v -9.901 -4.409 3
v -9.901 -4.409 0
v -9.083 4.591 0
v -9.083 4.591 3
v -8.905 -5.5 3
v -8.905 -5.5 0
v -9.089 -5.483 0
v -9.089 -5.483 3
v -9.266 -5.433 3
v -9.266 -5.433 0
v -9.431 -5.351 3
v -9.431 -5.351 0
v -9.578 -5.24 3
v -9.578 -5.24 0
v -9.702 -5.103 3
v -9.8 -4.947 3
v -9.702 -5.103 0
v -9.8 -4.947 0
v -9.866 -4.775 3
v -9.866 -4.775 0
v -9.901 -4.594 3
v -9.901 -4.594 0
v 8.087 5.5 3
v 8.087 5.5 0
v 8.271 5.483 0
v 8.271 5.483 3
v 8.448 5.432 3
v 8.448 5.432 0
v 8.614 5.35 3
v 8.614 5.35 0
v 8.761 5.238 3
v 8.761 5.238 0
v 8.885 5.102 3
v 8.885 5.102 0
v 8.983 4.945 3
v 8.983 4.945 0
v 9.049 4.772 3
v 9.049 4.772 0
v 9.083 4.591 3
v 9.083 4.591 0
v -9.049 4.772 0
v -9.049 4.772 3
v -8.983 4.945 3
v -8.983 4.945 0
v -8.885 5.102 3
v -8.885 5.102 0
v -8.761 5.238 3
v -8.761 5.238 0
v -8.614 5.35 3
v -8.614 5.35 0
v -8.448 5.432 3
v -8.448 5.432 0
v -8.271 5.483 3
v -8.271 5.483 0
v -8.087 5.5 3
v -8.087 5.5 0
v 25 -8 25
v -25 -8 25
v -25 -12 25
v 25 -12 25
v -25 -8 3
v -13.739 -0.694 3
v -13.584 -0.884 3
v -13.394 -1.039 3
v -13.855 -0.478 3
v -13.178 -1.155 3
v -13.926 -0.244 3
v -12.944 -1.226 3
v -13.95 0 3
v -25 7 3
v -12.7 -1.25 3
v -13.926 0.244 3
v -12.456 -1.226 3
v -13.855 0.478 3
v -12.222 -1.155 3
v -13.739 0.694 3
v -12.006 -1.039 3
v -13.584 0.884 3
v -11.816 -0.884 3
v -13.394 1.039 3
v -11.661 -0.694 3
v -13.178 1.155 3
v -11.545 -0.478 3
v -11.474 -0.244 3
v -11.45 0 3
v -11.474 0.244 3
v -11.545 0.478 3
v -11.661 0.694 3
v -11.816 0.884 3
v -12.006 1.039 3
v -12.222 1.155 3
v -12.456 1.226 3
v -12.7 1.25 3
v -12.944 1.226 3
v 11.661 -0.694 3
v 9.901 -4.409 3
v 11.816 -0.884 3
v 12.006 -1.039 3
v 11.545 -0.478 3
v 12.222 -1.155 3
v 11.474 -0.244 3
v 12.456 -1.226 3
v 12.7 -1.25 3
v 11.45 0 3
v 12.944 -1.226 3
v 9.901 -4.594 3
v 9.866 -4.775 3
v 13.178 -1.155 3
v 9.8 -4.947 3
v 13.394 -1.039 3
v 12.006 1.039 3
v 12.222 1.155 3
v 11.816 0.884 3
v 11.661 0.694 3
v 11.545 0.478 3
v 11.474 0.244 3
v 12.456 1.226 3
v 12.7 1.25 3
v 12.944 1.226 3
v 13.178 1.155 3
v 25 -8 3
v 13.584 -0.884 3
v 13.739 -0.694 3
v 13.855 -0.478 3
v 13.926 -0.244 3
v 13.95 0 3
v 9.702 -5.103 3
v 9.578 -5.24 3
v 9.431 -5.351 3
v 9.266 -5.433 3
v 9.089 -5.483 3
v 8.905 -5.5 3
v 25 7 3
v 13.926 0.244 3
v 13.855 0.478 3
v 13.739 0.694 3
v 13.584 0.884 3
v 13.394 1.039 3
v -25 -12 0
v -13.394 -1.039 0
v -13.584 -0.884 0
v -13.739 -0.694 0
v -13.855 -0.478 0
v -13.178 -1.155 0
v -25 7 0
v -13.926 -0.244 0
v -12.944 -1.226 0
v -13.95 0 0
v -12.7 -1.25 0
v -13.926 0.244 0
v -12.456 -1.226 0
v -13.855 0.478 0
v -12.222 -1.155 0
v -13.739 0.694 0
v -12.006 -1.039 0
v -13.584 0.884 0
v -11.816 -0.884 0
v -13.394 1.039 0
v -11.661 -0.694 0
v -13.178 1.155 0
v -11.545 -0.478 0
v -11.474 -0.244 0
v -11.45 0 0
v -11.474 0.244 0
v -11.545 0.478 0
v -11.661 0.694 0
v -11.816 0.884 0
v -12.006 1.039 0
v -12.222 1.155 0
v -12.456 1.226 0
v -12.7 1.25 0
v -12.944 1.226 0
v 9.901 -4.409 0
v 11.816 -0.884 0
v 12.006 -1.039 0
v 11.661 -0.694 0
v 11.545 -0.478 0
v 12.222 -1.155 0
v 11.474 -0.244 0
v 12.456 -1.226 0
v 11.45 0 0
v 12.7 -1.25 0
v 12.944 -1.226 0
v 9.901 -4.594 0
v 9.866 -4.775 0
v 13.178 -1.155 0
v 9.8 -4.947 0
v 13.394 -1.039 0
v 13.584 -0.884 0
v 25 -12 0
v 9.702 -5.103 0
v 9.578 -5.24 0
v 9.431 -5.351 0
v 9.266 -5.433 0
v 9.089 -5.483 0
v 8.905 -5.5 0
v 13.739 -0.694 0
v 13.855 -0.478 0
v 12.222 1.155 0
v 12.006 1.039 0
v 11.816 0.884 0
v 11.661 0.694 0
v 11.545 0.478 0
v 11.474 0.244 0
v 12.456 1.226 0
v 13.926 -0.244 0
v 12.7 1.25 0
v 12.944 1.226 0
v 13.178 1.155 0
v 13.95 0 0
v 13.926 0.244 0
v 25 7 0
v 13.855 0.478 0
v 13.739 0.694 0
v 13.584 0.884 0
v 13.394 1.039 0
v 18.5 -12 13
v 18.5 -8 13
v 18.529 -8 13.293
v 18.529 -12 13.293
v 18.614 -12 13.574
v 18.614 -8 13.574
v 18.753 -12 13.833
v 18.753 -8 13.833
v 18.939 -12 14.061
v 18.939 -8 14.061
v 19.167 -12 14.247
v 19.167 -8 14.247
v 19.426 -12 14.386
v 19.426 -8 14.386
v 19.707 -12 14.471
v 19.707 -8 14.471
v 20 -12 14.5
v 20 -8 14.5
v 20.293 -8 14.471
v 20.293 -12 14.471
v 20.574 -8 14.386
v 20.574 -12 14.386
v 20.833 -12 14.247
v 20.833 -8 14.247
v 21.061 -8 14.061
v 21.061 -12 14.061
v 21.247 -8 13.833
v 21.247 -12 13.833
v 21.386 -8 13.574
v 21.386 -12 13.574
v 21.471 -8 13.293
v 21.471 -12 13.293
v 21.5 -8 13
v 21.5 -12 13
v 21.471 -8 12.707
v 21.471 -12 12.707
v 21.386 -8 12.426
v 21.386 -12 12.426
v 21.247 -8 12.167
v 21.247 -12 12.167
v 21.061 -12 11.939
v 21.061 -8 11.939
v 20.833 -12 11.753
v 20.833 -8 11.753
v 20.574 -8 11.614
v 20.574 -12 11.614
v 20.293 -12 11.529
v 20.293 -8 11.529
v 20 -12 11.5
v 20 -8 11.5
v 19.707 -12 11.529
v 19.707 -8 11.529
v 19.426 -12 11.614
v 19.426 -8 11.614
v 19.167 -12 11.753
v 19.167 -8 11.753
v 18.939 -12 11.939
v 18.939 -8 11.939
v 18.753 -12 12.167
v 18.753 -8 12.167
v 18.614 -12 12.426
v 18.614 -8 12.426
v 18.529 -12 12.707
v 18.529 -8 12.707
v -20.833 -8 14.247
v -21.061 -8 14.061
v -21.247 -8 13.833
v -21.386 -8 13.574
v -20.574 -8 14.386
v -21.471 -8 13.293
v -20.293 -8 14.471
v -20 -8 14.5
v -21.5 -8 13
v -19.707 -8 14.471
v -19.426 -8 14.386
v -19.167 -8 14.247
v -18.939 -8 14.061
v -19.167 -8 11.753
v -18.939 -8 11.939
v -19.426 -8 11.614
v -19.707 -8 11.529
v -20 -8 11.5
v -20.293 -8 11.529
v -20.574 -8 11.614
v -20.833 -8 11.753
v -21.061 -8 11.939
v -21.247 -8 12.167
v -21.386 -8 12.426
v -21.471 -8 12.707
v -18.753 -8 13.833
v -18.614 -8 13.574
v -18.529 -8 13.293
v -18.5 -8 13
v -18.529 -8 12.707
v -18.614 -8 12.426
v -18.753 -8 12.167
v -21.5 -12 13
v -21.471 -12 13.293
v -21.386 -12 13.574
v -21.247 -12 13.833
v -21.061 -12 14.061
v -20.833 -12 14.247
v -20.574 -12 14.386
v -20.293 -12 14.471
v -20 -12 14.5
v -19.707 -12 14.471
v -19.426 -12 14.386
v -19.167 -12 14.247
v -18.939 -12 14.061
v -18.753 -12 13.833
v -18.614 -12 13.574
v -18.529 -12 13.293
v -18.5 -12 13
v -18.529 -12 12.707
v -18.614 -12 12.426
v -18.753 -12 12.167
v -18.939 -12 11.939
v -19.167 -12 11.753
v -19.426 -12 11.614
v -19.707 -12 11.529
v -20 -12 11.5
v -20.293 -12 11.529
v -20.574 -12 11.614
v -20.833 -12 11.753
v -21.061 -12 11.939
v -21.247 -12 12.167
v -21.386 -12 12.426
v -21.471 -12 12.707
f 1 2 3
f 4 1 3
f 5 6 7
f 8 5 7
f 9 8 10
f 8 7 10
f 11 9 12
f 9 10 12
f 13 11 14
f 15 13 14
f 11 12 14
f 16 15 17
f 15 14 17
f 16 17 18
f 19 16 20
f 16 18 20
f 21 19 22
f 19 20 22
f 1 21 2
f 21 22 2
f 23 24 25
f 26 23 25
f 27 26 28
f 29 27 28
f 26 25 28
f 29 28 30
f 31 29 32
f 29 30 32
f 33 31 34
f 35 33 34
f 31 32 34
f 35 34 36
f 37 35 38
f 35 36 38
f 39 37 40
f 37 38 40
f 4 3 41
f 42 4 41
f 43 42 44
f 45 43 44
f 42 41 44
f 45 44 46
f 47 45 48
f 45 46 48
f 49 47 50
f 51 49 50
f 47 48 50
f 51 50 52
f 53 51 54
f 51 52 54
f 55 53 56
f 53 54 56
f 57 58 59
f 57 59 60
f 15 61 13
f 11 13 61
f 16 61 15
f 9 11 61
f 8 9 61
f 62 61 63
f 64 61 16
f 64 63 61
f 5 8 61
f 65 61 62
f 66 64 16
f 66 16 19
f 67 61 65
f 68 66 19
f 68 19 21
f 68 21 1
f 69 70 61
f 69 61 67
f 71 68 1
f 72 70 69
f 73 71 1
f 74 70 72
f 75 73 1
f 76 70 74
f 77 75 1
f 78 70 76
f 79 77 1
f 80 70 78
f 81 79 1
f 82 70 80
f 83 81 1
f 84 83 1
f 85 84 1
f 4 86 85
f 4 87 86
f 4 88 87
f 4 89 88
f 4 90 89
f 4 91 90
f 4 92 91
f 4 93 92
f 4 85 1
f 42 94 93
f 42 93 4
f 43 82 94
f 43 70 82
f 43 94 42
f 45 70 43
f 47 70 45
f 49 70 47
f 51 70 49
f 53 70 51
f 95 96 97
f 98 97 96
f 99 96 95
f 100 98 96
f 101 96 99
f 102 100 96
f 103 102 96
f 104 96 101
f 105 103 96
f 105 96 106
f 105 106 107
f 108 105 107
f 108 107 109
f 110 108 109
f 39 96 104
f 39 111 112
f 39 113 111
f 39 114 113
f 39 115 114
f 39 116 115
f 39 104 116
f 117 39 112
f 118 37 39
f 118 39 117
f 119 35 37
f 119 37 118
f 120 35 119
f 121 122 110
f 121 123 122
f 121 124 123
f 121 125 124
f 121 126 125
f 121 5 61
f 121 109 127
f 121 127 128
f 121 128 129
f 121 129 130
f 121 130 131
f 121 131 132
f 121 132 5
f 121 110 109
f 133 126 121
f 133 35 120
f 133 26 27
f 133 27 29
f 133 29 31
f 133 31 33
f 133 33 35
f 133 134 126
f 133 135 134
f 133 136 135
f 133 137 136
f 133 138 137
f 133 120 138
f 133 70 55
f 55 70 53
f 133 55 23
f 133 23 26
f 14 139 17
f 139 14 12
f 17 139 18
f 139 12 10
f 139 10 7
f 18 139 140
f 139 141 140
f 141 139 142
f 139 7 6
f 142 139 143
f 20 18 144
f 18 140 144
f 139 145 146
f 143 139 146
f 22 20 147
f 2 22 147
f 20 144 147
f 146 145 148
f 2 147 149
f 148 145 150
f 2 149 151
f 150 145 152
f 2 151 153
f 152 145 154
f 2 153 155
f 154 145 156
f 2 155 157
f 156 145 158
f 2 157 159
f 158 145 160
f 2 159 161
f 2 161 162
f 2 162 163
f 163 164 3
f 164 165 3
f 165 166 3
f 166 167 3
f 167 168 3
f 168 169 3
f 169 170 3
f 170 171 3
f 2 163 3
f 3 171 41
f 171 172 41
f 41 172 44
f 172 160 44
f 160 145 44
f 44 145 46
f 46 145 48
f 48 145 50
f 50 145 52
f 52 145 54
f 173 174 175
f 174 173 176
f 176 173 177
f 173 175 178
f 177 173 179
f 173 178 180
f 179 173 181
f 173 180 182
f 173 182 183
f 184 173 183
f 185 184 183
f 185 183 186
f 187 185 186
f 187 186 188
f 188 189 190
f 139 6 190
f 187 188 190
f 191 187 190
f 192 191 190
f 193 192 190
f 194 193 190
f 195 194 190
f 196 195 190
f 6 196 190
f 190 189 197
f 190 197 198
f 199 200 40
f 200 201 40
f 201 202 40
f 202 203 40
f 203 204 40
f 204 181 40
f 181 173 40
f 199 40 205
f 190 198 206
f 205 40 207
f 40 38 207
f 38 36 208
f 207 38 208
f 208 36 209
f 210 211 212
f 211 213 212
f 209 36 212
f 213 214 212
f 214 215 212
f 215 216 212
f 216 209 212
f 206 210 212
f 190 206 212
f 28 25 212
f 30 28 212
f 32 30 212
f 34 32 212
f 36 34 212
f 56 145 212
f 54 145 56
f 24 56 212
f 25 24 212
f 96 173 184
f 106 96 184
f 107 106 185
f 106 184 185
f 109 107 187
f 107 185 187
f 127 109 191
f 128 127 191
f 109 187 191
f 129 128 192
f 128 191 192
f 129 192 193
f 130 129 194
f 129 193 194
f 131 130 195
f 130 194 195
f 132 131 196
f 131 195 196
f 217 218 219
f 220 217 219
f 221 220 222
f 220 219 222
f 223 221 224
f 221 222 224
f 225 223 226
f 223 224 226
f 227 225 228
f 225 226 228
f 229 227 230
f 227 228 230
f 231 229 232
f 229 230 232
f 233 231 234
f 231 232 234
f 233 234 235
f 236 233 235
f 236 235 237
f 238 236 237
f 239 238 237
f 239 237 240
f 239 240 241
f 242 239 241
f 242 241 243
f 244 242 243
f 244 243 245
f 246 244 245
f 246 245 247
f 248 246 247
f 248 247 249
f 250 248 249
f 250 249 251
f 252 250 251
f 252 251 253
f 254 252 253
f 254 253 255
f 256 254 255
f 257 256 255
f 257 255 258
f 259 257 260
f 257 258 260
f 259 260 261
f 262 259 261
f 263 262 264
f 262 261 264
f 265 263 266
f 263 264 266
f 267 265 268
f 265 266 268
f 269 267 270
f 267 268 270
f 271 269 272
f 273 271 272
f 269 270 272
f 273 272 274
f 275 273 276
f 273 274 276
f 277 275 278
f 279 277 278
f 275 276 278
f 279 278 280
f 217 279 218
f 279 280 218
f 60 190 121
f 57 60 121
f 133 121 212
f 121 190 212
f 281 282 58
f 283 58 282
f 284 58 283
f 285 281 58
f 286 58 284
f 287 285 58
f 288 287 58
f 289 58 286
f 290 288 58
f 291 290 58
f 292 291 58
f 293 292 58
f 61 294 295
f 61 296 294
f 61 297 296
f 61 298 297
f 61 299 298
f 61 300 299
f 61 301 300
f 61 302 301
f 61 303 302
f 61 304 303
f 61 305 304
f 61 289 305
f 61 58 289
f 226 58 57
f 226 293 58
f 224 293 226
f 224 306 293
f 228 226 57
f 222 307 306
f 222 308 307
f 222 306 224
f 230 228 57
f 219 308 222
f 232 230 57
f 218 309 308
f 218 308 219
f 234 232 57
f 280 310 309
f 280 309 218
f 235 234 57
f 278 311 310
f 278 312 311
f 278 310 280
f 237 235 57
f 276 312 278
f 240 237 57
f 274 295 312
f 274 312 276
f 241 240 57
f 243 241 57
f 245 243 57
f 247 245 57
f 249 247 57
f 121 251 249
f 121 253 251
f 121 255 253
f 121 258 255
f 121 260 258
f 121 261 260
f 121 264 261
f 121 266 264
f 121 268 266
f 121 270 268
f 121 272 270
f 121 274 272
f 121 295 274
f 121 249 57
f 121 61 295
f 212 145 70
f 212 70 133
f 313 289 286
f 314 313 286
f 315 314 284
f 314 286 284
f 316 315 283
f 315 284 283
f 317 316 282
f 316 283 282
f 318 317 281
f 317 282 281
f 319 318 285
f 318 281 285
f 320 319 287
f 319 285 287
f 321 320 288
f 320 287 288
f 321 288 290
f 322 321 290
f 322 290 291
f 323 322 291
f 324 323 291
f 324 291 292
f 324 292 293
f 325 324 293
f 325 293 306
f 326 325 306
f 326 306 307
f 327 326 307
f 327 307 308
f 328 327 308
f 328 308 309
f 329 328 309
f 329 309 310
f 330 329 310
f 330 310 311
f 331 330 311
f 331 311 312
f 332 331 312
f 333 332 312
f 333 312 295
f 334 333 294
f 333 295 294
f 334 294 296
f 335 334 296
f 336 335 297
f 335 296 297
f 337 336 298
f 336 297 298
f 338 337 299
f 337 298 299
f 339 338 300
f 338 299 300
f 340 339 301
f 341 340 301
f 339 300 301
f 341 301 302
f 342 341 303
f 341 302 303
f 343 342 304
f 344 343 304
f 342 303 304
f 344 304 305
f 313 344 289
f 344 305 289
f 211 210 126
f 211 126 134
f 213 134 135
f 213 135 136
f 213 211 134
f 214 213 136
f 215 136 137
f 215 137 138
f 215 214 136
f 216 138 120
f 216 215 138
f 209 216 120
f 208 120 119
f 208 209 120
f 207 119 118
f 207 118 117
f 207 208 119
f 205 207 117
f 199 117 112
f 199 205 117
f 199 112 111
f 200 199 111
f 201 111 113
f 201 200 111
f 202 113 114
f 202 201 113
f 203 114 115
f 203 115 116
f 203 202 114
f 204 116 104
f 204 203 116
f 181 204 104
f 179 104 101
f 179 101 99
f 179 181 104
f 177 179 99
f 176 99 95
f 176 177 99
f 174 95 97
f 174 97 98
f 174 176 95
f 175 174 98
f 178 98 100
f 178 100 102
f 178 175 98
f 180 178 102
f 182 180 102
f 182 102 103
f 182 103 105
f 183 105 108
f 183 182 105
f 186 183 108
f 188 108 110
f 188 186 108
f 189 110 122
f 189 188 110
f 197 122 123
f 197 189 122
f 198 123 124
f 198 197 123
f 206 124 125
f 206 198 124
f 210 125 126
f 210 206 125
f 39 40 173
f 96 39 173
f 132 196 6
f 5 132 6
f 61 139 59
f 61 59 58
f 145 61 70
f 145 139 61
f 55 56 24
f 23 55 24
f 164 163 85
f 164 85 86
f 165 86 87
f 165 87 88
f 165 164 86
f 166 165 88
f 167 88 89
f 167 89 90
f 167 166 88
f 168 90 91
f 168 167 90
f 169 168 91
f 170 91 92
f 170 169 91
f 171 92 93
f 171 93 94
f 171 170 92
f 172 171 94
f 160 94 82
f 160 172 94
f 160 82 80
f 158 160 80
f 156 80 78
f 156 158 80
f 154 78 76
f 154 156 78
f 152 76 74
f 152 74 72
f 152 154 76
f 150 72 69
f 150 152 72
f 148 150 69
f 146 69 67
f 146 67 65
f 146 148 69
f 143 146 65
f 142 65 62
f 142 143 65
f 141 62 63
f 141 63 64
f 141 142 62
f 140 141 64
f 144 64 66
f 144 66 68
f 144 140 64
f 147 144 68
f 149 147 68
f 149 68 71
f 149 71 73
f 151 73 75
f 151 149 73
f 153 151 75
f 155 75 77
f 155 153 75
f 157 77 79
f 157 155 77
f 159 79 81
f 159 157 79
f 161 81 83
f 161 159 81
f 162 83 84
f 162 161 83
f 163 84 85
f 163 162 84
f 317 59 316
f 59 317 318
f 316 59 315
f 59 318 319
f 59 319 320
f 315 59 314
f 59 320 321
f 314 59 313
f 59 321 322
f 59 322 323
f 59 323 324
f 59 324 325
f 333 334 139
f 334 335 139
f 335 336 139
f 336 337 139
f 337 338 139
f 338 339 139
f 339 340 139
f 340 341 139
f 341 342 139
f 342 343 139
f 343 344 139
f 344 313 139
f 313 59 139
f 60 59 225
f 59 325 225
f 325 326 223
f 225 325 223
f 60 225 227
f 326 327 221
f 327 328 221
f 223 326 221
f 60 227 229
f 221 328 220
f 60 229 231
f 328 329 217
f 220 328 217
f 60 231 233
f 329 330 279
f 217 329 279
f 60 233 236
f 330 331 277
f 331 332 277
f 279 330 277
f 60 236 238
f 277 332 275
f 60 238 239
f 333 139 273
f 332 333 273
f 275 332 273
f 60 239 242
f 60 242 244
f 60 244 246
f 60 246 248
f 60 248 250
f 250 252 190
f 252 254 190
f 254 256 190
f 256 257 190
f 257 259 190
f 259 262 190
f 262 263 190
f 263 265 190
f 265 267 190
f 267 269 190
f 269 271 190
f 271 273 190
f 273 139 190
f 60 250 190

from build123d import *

# Parameters (mm, degrees)
F0_W     = 50
F0_H     = 15
F0_R     = 1.25
F1_DEPTH = 3
F0_H_2   = 4
F2_DEPTH = 25
F4_R     = 1.5
F5_DEPTH = 4.001


with BuildPart() as f1:
    # F0 (on Top) → F1 (new body)
    with BuildSketch(Plane.XY):
        with Locations((0, -0.5)):
            Rectangle(F0_W, F0_H)
        with Locations((-12.7, 0)):
            Circle(F0_R, mode=Mode.SUBTRACT)
        with BuildLine():
            ThreePointArc((-9.0826785685, 4.590535746), (-8.7611236503, 5.2384225572), (-8.0867853621, 5.5))
            Line((-8.0867853621, 5.5), (8.0867853621, 5.5))
            ThreePointArc((8.0867853621, 5.5), (8.7611236503, 5.2384225572), (9.0826785685, 4.590535746))
            Line((9.0826785685, 4.590535746), (9.9008603867, -4.409464254))
            ThreePointArc((9.9008603867, -4.409464254), (9.6433897375, -5.1743382882), (8.9049671803, -5.5))
            Line((8.9049671803, -5.5), (-8.9049671803, -5.5))
            ThreePointArc((-8.9049671803, -5.5), (-9.6433897375, -5.1743382882), (-9.9008603867, -4.409464254))
            Line((-9.9008603867, -4.409464254), (-9.0826785685, 4.590535746))
        make_face(mode=Mode.SUBTRACT)
        with Locations((12.7, 0)):
            Circle(F0_R, mode=Mode.SUBTRACT)
    extrude(amount=F1_DEPTH)

    # F0 (on Top) → F2 (join)
    with BuildSketch(Plane.XY):
        with Locations((0, -10)):
            Rectangle(F0_W, F0_H_2)
    extrude(amount=F2_DEPTH)

    # F4 (on offset) → F5 (cut, through all)
    with BuildSketch(Plane(origin=(0, -8, 0), x_dir=(-1, 0, 0), z_dir=(0, 1, 0))):
        with Locations((-20, 13)):
            Circle(F4_R)
        with Locations((20, 13)):
            Circle(F4_R)
    extrude(amount=-F5_DEPTH, mode=Mode.SUBTRACT)


solid = f1.part
